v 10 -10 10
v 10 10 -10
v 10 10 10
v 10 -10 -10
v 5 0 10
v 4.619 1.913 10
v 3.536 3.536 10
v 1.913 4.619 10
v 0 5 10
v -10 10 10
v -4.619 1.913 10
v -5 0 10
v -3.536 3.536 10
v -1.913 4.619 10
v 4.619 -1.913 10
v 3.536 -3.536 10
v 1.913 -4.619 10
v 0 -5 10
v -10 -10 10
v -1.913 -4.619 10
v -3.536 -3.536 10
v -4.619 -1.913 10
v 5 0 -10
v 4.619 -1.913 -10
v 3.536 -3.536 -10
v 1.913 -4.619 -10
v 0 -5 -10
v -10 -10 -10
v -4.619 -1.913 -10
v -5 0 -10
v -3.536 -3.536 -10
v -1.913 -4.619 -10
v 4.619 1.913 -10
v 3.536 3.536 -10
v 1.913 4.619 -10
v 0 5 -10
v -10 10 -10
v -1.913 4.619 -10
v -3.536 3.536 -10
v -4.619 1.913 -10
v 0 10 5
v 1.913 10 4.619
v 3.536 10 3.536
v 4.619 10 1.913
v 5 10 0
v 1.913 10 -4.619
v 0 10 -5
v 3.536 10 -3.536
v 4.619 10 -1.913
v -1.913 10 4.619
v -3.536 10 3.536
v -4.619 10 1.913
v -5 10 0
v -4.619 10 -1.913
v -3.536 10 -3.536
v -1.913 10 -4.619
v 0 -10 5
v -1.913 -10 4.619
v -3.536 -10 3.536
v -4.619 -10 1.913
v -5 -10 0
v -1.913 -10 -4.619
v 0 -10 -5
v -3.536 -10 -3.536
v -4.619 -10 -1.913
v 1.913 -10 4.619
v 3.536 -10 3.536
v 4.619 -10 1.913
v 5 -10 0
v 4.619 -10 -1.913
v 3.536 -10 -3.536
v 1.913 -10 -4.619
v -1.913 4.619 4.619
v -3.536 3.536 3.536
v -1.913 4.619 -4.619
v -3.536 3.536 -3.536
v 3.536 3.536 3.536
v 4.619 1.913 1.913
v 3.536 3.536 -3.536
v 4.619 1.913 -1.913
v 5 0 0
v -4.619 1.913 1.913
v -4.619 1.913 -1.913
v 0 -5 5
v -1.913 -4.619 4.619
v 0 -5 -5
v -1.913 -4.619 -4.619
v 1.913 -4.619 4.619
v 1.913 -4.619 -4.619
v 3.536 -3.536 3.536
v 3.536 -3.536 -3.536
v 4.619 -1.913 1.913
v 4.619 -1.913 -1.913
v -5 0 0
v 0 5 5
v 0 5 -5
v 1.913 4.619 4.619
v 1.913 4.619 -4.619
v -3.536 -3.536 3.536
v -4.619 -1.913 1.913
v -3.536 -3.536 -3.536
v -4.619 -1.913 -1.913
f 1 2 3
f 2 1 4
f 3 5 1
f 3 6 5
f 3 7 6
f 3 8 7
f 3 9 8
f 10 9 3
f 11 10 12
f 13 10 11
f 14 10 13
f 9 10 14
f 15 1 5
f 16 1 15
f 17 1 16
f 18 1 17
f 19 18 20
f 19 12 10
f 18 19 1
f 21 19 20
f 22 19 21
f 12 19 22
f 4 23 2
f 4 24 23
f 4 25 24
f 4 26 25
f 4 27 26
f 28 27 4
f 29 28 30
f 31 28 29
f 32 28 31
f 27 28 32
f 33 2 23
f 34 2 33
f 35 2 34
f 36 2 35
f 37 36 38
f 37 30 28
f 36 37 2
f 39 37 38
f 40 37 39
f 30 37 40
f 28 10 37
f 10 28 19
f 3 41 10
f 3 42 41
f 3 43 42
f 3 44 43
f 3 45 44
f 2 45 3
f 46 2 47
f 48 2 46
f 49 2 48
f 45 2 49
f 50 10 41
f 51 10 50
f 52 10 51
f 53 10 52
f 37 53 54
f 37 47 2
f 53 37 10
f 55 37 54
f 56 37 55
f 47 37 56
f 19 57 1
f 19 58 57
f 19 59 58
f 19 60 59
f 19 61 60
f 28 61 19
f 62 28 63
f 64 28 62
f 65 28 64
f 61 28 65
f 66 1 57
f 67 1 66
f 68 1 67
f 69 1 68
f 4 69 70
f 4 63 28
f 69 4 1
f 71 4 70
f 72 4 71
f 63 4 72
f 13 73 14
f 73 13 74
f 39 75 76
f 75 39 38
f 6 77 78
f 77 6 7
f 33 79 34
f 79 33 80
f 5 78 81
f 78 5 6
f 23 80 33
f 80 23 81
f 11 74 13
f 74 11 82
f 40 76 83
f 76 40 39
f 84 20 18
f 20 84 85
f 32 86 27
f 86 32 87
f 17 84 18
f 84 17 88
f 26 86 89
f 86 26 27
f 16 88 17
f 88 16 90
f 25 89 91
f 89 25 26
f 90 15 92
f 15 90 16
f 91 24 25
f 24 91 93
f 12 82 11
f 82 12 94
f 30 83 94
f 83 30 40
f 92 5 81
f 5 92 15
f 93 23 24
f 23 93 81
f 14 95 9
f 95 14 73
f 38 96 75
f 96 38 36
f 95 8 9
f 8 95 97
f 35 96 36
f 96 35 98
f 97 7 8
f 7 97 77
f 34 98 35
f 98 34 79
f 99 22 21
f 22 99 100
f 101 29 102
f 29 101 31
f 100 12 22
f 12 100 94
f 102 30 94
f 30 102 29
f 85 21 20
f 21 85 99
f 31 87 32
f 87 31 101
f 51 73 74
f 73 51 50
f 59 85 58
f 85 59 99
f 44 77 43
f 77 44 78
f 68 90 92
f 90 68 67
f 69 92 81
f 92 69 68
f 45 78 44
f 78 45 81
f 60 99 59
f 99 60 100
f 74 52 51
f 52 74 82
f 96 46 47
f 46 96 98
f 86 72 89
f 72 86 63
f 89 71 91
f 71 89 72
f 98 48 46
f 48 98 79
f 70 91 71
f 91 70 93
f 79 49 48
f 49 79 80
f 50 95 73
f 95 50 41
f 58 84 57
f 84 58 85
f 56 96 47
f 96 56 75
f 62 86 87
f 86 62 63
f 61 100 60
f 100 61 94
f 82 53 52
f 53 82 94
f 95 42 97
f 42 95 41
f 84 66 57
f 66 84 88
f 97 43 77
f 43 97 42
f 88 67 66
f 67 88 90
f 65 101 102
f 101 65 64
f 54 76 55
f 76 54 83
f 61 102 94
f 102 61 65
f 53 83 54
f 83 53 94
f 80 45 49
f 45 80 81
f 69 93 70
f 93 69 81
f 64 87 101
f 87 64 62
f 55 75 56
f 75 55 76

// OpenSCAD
/*
    Cube with holes
*/
cube_size = 20;
hole_radius = 5;
hole_height = 21;
facets = 16;
difference() {
    cube([cube_size, cube_size, cube_size], center=true);
    cylinder(h=hole_height, r=hole_radius, center=true, $fn=facets);
    rotate([90, 0, 0]) cylinder(h=hole_height, r=hole_radius, center=true, $fn=facets);
}
